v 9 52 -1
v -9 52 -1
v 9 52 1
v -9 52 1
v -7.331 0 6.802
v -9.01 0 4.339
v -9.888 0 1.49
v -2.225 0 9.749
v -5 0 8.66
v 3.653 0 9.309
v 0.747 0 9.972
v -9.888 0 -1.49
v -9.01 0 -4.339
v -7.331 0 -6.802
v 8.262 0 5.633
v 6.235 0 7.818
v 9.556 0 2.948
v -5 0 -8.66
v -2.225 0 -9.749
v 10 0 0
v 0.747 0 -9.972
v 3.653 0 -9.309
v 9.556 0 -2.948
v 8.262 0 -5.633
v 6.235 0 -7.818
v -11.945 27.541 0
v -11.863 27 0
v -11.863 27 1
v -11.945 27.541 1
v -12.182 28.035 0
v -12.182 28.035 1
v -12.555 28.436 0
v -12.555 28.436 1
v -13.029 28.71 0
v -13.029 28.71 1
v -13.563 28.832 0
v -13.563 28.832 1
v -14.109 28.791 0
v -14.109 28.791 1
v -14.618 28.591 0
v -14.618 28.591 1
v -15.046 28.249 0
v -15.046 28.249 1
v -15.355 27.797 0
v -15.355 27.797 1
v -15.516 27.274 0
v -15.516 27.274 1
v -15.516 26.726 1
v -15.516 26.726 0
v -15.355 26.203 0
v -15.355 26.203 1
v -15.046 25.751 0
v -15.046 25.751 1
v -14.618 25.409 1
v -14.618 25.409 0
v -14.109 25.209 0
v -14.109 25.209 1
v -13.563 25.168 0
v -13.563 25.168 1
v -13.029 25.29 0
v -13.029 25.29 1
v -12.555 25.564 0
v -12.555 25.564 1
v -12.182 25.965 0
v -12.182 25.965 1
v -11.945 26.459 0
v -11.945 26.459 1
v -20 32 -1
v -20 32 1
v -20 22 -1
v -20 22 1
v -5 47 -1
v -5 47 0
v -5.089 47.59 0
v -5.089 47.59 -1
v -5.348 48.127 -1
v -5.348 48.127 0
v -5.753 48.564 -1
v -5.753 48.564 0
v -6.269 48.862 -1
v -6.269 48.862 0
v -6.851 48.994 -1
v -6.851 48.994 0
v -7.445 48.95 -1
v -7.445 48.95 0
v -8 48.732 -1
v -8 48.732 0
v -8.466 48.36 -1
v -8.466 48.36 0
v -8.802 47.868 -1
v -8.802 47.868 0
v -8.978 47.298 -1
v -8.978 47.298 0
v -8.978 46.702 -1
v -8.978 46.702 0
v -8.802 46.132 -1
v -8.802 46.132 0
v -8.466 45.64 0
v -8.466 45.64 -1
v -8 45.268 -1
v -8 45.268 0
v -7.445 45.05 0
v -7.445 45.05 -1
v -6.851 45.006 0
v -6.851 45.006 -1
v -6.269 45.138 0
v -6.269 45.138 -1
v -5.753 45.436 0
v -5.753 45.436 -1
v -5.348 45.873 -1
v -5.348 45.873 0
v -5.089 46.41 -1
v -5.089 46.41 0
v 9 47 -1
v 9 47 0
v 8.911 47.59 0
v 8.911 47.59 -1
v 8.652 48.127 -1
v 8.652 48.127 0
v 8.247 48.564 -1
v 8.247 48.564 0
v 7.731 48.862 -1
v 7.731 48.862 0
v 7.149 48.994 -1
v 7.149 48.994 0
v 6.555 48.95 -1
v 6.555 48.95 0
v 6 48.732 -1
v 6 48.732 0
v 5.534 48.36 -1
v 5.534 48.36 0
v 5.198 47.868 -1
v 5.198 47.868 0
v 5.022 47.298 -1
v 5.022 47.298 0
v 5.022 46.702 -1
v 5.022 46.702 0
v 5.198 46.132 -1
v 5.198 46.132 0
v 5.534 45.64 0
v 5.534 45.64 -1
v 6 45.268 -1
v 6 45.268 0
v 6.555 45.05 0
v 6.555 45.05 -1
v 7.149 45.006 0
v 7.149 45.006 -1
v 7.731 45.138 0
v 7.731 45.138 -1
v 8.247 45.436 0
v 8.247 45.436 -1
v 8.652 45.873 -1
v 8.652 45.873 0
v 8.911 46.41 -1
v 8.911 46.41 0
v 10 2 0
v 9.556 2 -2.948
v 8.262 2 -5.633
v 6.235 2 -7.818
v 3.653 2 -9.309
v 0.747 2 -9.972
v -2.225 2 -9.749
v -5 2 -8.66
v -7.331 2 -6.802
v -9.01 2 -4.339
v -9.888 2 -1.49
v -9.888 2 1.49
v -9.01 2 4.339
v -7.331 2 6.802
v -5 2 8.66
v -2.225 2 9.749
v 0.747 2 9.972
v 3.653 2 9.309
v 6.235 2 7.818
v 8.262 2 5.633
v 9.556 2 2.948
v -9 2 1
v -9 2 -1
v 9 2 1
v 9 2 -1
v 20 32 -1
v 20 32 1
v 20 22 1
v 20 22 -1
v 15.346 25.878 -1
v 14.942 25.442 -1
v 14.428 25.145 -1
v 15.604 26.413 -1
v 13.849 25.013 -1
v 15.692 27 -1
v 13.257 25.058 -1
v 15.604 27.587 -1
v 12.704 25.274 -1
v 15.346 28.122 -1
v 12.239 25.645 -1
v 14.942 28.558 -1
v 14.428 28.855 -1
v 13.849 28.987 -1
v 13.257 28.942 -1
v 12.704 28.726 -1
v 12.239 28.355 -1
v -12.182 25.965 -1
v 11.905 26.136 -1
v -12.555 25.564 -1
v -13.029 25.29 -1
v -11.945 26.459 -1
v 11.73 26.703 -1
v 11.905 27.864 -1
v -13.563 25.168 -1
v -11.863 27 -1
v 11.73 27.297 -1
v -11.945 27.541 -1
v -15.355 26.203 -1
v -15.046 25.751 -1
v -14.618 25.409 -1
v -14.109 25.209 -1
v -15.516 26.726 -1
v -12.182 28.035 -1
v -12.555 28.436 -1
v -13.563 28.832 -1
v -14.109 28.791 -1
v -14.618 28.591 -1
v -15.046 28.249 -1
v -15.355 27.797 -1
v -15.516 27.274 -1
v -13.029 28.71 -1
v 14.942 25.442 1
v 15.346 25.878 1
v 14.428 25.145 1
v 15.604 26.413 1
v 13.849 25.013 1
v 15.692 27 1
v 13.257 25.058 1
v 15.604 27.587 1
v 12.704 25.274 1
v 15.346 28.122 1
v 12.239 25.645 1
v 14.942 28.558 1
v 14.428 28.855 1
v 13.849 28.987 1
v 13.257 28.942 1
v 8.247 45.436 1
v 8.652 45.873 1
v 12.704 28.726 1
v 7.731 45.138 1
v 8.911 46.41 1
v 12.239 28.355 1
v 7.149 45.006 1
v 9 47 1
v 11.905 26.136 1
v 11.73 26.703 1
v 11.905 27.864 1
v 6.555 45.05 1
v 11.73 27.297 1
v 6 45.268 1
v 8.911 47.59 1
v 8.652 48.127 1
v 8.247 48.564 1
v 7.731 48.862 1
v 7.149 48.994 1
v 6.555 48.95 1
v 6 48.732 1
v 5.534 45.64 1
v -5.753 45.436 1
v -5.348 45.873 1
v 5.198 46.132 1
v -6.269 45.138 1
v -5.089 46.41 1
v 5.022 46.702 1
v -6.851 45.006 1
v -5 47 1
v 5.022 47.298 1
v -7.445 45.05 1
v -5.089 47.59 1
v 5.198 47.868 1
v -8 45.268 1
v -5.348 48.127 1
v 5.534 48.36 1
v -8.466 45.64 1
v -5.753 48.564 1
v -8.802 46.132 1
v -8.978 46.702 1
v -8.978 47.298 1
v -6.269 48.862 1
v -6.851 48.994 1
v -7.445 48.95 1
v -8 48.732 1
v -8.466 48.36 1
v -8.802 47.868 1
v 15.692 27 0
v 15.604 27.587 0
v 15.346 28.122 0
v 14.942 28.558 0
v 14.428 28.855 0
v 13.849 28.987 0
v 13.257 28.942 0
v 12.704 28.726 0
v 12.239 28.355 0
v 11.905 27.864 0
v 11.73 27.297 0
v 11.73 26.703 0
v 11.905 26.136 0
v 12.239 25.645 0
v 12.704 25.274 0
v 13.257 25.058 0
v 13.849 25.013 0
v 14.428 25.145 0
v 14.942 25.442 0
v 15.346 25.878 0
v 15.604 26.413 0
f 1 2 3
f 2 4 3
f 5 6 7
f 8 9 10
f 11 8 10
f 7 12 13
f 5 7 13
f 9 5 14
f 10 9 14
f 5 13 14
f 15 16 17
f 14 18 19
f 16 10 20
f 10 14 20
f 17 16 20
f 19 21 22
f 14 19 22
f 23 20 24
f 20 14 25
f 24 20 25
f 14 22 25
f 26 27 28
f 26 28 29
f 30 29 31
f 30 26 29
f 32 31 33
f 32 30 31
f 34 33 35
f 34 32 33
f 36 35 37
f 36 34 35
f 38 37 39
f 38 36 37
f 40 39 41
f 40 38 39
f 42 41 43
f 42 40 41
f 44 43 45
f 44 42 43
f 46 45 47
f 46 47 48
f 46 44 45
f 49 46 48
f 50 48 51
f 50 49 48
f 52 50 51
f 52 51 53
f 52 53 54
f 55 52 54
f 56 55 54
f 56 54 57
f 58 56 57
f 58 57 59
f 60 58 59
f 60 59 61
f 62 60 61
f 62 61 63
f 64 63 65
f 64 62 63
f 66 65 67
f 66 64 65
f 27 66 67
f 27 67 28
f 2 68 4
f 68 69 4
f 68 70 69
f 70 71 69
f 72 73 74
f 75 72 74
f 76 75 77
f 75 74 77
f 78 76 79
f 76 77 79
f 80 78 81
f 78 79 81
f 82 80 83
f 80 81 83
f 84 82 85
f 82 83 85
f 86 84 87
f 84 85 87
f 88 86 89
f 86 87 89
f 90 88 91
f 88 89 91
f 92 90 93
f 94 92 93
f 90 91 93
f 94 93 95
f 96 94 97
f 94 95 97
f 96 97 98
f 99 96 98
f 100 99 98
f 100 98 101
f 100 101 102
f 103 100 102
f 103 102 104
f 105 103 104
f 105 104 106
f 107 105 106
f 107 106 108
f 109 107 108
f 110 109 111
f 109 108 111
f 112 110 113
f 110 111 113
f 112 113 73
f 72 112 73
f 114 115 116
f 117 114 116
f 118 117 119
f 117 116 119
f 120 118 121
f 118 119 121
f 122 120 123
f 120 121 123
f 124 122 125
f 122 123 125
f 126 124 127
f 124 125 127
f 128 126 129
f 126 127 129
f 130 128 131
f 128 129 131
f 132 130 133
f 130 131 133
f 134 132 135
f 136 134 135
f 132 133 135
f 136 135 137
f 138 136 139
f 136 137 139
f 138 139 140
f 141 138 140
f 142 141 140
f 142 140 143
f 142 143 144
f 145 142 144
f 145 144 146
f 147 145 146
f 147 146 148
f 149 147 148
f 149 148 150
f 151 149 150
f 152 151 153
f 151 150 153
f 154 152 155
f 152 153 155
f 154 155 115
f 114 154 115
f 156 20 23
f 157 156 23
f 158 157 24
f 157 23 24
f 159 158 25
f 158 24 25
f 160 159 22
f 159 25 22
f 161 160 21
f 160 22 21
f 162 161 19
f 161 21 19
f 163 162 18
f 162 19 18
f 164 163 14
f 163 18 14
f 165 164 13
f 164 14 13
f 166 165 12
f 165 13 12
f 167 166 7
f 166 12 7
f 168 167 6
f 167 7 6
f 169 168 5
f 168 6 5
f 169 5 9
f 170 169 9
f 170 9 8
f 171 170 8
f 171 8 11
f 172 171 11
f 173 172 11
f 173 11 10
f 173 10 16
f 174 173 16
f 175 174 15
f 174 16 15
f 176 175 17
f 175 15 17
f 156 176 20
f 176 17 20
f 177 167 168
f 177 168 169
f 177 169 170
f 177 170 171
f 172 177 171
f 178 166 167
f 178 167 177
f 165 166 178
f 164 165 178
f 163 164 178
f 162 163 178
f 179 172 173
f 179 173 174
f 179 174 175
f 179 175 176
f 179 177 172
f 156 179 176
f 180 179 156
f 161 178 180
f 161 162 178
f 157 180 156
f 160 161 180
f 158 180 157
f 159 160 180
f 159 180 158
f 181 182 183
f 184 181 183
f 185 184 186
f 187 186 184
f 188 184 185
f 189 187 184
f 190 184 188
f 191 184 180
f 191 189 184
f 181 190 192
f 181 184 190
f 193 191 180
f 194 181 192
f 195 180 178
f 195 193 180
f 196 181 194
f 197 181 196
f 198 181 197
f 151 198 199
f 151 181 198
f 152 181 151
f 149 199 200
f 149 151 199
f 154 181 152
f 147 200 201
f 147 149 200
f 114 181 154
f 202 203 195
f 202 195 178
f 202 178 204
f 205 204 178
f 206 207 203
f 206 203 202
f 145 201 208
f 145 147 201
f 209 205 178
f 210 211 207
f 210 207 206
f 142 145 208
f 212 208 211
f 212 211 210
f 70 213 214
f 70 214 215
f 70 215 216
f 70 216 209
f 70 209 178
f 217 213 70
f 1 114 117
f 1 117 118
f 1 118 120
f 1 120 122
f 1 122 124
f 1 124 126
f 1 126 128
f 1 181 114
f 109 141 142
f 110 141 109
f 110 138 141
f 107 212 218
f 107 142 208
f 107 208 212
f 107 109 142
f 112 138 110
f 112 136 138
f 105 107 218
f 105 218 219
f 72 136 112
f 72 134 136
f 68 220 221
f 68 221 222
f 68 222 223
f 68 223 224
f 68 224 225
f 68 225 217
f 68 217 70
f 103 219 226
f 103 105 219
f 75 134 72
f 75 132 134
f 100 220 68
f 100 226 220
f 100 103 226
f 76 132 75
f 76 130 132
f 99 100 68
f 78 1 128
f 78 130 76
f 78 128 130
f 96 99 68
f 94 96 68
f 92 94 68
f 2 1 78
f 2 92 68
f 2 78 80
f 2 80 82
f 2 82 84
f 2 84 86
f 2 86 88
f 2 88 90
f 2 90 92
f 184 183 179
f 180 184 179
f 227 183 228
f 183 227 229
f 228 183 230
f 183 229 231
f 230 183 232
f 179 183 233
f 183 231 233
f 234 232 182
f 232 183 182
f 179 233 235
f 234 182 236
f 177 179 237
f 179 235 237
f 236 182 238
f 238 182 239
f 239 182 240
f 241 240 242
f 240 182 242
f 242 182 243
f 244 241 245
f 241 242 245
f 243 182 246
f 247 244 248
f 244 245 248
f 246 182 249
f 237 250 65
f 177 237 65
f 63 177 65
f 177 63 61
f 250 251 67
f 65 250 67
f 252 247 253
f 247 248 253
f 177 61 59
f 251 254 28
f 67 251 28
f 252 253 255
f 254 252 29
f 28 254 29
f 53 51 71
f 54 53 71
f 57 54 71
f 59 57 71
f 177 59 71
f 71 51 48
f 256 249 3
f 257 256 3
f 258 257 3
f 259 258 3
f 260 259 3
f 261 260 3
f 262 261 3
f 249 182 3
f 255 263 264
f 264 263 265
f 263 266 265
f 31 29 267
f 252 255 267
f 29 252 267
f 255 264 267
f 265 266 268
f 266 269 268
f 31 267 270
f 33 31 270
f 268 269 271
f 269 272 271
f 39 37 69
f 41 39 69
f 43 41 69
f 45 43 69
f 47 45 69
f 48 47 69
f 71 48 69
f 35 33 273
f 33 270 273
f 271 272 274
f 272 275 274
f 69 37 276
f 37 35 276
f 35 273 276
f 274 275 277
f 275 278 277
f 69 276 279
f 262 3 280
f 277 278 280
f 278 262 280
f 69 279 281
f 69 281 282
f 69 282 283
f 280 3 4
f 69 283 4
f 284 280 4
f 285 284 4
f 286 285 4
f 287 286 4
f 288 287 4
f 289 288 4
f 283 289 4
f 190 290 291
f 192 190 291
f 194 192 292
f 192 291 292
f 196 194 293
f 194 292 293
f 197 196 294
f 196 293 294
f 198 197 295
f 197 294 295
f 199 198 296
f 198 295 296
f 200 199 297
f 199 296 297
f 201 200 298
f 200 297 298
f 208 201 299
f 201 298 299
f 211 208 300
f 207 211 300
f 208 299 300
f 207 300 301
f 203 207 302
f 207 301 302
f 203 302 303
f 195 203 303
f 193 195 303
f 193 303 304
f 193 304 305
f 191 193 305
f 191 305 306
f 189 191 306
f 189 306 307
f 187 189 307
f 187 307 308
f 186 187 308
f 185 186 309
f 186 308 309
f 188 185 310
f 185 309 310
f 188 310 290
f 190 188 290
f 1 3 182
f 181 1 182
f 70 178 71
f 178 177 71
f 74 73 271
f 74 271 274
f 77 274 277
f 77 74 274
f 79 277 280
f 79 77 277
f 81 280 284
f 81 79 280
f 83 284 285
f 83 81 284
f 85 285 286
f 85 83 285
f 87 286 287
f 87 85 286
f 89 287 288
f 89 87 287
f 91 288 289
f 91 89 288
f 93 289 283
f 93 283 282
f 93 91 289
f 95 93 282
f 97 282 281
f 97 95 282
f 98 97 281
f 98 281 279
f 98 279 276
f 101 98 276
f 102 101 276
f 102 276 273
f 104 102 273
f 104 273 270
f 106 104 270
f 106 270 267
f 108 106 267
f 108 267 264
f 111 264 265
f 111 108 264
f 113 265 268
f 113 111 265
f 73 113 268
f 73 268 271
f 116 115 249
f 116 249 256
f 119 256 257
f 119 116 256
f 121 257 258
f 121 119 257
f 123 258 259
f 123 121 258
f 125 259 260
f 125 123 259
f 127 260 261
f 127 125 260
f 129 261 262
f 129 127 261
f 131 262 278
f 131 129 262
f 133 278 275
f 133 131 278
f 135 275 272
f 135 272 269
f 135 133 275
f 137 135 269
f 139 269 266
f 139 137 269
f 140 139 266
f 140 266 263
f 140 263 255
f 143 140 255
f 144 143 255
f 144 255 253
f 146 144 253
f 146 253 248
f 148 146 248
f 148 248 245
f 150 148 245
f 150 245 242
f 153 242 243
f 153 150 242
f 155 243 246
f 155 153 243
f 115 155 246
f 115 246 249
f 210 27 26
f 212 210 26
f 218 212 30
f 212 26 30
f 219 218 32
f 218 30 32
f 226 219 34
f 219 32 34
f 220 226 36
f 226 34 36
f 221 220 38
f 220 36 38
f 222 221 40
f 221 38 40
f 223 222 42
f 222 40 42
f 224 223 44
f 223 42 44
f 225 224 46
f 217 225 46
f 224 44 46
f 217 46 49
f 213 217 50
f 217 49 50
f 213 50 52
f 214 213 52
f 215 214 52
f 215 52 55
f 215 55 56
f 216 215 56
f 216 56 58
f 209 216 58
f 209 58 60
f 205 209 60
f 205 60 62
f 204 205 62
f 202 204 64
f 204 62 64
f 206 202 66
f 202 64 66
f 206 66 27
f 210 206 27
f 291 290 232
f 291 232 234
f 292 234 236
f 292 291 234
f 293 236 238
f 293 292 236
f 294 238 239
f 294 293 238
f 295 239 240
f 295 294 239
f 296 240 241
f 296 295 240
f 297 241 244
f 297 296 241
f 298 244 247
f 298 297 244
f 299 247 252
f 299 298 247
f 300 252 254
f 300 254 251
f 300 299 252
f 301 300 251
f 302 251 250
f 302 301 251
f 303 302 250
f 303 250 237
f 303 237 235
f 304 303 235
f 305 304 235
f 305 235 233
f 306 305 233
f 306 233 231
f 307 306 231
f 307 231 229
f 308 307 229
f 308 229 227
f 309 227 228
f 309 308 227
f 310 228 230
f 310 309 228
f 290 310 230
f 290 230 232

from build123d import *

# Parameters (mm, degrees)
SKETCH_1_R           = 10
EXTRUDE_1_DEPTH      = 2
EXTRUDE_2_DEPTH      = 1
EXTRUDE_2_DEPTH_BACK = 1
SKETCH_3_R           = 2
SKETCH_3_R_2         = 1.992440636
SKETCH_3_R_3         = 1.836667673


with BuildPart() as part:
    # 草图1 → 凸台-拉伸1 (new body)
    with BuildSketch(Plane(origin=(0, 0, 0), x_dir=(1, 0, 0), z_dir=(0, 1, 0))):
        Circle(SKETCH_1_R)
    extrude(amount=EXTRUDE_1_DEPTH)

    # 草图3 → 凸台-拉伸2 (add, two sides: drawn at the far end of the back side and taken through both)
    with BuildSketch(Plane.XY.offset(-EXTRUDE_2_DEPTH_BACK)):
        Polygon((9, 2), (-9, 2), (-20, 22), (-20, 32), (-9, 52), (9, 52), (20, 32), (20, 22), align=None)
        with Locations((-7, 47)):
            Circle(SKETCH_3_R, mode=Mode.SUBTRACT)
        with Locations((7, 47)):
            Circle(SKETCH_3_R, mode=Mode.SUBTRACT)
        with Locations((13.7, 27)):
            Circle(SKETCH_3_R_2, mode=Mode.SUBTRACT)
        with Locations((-13.7, 27)):
            Circle(SKETCH_3_R_3, mode=Mode.SUBTRACT)
    extrude(amount=EXTRUDE_2_DEPTH + EXTRUDE_2_DEPTH_BACK)


solid = part.part
